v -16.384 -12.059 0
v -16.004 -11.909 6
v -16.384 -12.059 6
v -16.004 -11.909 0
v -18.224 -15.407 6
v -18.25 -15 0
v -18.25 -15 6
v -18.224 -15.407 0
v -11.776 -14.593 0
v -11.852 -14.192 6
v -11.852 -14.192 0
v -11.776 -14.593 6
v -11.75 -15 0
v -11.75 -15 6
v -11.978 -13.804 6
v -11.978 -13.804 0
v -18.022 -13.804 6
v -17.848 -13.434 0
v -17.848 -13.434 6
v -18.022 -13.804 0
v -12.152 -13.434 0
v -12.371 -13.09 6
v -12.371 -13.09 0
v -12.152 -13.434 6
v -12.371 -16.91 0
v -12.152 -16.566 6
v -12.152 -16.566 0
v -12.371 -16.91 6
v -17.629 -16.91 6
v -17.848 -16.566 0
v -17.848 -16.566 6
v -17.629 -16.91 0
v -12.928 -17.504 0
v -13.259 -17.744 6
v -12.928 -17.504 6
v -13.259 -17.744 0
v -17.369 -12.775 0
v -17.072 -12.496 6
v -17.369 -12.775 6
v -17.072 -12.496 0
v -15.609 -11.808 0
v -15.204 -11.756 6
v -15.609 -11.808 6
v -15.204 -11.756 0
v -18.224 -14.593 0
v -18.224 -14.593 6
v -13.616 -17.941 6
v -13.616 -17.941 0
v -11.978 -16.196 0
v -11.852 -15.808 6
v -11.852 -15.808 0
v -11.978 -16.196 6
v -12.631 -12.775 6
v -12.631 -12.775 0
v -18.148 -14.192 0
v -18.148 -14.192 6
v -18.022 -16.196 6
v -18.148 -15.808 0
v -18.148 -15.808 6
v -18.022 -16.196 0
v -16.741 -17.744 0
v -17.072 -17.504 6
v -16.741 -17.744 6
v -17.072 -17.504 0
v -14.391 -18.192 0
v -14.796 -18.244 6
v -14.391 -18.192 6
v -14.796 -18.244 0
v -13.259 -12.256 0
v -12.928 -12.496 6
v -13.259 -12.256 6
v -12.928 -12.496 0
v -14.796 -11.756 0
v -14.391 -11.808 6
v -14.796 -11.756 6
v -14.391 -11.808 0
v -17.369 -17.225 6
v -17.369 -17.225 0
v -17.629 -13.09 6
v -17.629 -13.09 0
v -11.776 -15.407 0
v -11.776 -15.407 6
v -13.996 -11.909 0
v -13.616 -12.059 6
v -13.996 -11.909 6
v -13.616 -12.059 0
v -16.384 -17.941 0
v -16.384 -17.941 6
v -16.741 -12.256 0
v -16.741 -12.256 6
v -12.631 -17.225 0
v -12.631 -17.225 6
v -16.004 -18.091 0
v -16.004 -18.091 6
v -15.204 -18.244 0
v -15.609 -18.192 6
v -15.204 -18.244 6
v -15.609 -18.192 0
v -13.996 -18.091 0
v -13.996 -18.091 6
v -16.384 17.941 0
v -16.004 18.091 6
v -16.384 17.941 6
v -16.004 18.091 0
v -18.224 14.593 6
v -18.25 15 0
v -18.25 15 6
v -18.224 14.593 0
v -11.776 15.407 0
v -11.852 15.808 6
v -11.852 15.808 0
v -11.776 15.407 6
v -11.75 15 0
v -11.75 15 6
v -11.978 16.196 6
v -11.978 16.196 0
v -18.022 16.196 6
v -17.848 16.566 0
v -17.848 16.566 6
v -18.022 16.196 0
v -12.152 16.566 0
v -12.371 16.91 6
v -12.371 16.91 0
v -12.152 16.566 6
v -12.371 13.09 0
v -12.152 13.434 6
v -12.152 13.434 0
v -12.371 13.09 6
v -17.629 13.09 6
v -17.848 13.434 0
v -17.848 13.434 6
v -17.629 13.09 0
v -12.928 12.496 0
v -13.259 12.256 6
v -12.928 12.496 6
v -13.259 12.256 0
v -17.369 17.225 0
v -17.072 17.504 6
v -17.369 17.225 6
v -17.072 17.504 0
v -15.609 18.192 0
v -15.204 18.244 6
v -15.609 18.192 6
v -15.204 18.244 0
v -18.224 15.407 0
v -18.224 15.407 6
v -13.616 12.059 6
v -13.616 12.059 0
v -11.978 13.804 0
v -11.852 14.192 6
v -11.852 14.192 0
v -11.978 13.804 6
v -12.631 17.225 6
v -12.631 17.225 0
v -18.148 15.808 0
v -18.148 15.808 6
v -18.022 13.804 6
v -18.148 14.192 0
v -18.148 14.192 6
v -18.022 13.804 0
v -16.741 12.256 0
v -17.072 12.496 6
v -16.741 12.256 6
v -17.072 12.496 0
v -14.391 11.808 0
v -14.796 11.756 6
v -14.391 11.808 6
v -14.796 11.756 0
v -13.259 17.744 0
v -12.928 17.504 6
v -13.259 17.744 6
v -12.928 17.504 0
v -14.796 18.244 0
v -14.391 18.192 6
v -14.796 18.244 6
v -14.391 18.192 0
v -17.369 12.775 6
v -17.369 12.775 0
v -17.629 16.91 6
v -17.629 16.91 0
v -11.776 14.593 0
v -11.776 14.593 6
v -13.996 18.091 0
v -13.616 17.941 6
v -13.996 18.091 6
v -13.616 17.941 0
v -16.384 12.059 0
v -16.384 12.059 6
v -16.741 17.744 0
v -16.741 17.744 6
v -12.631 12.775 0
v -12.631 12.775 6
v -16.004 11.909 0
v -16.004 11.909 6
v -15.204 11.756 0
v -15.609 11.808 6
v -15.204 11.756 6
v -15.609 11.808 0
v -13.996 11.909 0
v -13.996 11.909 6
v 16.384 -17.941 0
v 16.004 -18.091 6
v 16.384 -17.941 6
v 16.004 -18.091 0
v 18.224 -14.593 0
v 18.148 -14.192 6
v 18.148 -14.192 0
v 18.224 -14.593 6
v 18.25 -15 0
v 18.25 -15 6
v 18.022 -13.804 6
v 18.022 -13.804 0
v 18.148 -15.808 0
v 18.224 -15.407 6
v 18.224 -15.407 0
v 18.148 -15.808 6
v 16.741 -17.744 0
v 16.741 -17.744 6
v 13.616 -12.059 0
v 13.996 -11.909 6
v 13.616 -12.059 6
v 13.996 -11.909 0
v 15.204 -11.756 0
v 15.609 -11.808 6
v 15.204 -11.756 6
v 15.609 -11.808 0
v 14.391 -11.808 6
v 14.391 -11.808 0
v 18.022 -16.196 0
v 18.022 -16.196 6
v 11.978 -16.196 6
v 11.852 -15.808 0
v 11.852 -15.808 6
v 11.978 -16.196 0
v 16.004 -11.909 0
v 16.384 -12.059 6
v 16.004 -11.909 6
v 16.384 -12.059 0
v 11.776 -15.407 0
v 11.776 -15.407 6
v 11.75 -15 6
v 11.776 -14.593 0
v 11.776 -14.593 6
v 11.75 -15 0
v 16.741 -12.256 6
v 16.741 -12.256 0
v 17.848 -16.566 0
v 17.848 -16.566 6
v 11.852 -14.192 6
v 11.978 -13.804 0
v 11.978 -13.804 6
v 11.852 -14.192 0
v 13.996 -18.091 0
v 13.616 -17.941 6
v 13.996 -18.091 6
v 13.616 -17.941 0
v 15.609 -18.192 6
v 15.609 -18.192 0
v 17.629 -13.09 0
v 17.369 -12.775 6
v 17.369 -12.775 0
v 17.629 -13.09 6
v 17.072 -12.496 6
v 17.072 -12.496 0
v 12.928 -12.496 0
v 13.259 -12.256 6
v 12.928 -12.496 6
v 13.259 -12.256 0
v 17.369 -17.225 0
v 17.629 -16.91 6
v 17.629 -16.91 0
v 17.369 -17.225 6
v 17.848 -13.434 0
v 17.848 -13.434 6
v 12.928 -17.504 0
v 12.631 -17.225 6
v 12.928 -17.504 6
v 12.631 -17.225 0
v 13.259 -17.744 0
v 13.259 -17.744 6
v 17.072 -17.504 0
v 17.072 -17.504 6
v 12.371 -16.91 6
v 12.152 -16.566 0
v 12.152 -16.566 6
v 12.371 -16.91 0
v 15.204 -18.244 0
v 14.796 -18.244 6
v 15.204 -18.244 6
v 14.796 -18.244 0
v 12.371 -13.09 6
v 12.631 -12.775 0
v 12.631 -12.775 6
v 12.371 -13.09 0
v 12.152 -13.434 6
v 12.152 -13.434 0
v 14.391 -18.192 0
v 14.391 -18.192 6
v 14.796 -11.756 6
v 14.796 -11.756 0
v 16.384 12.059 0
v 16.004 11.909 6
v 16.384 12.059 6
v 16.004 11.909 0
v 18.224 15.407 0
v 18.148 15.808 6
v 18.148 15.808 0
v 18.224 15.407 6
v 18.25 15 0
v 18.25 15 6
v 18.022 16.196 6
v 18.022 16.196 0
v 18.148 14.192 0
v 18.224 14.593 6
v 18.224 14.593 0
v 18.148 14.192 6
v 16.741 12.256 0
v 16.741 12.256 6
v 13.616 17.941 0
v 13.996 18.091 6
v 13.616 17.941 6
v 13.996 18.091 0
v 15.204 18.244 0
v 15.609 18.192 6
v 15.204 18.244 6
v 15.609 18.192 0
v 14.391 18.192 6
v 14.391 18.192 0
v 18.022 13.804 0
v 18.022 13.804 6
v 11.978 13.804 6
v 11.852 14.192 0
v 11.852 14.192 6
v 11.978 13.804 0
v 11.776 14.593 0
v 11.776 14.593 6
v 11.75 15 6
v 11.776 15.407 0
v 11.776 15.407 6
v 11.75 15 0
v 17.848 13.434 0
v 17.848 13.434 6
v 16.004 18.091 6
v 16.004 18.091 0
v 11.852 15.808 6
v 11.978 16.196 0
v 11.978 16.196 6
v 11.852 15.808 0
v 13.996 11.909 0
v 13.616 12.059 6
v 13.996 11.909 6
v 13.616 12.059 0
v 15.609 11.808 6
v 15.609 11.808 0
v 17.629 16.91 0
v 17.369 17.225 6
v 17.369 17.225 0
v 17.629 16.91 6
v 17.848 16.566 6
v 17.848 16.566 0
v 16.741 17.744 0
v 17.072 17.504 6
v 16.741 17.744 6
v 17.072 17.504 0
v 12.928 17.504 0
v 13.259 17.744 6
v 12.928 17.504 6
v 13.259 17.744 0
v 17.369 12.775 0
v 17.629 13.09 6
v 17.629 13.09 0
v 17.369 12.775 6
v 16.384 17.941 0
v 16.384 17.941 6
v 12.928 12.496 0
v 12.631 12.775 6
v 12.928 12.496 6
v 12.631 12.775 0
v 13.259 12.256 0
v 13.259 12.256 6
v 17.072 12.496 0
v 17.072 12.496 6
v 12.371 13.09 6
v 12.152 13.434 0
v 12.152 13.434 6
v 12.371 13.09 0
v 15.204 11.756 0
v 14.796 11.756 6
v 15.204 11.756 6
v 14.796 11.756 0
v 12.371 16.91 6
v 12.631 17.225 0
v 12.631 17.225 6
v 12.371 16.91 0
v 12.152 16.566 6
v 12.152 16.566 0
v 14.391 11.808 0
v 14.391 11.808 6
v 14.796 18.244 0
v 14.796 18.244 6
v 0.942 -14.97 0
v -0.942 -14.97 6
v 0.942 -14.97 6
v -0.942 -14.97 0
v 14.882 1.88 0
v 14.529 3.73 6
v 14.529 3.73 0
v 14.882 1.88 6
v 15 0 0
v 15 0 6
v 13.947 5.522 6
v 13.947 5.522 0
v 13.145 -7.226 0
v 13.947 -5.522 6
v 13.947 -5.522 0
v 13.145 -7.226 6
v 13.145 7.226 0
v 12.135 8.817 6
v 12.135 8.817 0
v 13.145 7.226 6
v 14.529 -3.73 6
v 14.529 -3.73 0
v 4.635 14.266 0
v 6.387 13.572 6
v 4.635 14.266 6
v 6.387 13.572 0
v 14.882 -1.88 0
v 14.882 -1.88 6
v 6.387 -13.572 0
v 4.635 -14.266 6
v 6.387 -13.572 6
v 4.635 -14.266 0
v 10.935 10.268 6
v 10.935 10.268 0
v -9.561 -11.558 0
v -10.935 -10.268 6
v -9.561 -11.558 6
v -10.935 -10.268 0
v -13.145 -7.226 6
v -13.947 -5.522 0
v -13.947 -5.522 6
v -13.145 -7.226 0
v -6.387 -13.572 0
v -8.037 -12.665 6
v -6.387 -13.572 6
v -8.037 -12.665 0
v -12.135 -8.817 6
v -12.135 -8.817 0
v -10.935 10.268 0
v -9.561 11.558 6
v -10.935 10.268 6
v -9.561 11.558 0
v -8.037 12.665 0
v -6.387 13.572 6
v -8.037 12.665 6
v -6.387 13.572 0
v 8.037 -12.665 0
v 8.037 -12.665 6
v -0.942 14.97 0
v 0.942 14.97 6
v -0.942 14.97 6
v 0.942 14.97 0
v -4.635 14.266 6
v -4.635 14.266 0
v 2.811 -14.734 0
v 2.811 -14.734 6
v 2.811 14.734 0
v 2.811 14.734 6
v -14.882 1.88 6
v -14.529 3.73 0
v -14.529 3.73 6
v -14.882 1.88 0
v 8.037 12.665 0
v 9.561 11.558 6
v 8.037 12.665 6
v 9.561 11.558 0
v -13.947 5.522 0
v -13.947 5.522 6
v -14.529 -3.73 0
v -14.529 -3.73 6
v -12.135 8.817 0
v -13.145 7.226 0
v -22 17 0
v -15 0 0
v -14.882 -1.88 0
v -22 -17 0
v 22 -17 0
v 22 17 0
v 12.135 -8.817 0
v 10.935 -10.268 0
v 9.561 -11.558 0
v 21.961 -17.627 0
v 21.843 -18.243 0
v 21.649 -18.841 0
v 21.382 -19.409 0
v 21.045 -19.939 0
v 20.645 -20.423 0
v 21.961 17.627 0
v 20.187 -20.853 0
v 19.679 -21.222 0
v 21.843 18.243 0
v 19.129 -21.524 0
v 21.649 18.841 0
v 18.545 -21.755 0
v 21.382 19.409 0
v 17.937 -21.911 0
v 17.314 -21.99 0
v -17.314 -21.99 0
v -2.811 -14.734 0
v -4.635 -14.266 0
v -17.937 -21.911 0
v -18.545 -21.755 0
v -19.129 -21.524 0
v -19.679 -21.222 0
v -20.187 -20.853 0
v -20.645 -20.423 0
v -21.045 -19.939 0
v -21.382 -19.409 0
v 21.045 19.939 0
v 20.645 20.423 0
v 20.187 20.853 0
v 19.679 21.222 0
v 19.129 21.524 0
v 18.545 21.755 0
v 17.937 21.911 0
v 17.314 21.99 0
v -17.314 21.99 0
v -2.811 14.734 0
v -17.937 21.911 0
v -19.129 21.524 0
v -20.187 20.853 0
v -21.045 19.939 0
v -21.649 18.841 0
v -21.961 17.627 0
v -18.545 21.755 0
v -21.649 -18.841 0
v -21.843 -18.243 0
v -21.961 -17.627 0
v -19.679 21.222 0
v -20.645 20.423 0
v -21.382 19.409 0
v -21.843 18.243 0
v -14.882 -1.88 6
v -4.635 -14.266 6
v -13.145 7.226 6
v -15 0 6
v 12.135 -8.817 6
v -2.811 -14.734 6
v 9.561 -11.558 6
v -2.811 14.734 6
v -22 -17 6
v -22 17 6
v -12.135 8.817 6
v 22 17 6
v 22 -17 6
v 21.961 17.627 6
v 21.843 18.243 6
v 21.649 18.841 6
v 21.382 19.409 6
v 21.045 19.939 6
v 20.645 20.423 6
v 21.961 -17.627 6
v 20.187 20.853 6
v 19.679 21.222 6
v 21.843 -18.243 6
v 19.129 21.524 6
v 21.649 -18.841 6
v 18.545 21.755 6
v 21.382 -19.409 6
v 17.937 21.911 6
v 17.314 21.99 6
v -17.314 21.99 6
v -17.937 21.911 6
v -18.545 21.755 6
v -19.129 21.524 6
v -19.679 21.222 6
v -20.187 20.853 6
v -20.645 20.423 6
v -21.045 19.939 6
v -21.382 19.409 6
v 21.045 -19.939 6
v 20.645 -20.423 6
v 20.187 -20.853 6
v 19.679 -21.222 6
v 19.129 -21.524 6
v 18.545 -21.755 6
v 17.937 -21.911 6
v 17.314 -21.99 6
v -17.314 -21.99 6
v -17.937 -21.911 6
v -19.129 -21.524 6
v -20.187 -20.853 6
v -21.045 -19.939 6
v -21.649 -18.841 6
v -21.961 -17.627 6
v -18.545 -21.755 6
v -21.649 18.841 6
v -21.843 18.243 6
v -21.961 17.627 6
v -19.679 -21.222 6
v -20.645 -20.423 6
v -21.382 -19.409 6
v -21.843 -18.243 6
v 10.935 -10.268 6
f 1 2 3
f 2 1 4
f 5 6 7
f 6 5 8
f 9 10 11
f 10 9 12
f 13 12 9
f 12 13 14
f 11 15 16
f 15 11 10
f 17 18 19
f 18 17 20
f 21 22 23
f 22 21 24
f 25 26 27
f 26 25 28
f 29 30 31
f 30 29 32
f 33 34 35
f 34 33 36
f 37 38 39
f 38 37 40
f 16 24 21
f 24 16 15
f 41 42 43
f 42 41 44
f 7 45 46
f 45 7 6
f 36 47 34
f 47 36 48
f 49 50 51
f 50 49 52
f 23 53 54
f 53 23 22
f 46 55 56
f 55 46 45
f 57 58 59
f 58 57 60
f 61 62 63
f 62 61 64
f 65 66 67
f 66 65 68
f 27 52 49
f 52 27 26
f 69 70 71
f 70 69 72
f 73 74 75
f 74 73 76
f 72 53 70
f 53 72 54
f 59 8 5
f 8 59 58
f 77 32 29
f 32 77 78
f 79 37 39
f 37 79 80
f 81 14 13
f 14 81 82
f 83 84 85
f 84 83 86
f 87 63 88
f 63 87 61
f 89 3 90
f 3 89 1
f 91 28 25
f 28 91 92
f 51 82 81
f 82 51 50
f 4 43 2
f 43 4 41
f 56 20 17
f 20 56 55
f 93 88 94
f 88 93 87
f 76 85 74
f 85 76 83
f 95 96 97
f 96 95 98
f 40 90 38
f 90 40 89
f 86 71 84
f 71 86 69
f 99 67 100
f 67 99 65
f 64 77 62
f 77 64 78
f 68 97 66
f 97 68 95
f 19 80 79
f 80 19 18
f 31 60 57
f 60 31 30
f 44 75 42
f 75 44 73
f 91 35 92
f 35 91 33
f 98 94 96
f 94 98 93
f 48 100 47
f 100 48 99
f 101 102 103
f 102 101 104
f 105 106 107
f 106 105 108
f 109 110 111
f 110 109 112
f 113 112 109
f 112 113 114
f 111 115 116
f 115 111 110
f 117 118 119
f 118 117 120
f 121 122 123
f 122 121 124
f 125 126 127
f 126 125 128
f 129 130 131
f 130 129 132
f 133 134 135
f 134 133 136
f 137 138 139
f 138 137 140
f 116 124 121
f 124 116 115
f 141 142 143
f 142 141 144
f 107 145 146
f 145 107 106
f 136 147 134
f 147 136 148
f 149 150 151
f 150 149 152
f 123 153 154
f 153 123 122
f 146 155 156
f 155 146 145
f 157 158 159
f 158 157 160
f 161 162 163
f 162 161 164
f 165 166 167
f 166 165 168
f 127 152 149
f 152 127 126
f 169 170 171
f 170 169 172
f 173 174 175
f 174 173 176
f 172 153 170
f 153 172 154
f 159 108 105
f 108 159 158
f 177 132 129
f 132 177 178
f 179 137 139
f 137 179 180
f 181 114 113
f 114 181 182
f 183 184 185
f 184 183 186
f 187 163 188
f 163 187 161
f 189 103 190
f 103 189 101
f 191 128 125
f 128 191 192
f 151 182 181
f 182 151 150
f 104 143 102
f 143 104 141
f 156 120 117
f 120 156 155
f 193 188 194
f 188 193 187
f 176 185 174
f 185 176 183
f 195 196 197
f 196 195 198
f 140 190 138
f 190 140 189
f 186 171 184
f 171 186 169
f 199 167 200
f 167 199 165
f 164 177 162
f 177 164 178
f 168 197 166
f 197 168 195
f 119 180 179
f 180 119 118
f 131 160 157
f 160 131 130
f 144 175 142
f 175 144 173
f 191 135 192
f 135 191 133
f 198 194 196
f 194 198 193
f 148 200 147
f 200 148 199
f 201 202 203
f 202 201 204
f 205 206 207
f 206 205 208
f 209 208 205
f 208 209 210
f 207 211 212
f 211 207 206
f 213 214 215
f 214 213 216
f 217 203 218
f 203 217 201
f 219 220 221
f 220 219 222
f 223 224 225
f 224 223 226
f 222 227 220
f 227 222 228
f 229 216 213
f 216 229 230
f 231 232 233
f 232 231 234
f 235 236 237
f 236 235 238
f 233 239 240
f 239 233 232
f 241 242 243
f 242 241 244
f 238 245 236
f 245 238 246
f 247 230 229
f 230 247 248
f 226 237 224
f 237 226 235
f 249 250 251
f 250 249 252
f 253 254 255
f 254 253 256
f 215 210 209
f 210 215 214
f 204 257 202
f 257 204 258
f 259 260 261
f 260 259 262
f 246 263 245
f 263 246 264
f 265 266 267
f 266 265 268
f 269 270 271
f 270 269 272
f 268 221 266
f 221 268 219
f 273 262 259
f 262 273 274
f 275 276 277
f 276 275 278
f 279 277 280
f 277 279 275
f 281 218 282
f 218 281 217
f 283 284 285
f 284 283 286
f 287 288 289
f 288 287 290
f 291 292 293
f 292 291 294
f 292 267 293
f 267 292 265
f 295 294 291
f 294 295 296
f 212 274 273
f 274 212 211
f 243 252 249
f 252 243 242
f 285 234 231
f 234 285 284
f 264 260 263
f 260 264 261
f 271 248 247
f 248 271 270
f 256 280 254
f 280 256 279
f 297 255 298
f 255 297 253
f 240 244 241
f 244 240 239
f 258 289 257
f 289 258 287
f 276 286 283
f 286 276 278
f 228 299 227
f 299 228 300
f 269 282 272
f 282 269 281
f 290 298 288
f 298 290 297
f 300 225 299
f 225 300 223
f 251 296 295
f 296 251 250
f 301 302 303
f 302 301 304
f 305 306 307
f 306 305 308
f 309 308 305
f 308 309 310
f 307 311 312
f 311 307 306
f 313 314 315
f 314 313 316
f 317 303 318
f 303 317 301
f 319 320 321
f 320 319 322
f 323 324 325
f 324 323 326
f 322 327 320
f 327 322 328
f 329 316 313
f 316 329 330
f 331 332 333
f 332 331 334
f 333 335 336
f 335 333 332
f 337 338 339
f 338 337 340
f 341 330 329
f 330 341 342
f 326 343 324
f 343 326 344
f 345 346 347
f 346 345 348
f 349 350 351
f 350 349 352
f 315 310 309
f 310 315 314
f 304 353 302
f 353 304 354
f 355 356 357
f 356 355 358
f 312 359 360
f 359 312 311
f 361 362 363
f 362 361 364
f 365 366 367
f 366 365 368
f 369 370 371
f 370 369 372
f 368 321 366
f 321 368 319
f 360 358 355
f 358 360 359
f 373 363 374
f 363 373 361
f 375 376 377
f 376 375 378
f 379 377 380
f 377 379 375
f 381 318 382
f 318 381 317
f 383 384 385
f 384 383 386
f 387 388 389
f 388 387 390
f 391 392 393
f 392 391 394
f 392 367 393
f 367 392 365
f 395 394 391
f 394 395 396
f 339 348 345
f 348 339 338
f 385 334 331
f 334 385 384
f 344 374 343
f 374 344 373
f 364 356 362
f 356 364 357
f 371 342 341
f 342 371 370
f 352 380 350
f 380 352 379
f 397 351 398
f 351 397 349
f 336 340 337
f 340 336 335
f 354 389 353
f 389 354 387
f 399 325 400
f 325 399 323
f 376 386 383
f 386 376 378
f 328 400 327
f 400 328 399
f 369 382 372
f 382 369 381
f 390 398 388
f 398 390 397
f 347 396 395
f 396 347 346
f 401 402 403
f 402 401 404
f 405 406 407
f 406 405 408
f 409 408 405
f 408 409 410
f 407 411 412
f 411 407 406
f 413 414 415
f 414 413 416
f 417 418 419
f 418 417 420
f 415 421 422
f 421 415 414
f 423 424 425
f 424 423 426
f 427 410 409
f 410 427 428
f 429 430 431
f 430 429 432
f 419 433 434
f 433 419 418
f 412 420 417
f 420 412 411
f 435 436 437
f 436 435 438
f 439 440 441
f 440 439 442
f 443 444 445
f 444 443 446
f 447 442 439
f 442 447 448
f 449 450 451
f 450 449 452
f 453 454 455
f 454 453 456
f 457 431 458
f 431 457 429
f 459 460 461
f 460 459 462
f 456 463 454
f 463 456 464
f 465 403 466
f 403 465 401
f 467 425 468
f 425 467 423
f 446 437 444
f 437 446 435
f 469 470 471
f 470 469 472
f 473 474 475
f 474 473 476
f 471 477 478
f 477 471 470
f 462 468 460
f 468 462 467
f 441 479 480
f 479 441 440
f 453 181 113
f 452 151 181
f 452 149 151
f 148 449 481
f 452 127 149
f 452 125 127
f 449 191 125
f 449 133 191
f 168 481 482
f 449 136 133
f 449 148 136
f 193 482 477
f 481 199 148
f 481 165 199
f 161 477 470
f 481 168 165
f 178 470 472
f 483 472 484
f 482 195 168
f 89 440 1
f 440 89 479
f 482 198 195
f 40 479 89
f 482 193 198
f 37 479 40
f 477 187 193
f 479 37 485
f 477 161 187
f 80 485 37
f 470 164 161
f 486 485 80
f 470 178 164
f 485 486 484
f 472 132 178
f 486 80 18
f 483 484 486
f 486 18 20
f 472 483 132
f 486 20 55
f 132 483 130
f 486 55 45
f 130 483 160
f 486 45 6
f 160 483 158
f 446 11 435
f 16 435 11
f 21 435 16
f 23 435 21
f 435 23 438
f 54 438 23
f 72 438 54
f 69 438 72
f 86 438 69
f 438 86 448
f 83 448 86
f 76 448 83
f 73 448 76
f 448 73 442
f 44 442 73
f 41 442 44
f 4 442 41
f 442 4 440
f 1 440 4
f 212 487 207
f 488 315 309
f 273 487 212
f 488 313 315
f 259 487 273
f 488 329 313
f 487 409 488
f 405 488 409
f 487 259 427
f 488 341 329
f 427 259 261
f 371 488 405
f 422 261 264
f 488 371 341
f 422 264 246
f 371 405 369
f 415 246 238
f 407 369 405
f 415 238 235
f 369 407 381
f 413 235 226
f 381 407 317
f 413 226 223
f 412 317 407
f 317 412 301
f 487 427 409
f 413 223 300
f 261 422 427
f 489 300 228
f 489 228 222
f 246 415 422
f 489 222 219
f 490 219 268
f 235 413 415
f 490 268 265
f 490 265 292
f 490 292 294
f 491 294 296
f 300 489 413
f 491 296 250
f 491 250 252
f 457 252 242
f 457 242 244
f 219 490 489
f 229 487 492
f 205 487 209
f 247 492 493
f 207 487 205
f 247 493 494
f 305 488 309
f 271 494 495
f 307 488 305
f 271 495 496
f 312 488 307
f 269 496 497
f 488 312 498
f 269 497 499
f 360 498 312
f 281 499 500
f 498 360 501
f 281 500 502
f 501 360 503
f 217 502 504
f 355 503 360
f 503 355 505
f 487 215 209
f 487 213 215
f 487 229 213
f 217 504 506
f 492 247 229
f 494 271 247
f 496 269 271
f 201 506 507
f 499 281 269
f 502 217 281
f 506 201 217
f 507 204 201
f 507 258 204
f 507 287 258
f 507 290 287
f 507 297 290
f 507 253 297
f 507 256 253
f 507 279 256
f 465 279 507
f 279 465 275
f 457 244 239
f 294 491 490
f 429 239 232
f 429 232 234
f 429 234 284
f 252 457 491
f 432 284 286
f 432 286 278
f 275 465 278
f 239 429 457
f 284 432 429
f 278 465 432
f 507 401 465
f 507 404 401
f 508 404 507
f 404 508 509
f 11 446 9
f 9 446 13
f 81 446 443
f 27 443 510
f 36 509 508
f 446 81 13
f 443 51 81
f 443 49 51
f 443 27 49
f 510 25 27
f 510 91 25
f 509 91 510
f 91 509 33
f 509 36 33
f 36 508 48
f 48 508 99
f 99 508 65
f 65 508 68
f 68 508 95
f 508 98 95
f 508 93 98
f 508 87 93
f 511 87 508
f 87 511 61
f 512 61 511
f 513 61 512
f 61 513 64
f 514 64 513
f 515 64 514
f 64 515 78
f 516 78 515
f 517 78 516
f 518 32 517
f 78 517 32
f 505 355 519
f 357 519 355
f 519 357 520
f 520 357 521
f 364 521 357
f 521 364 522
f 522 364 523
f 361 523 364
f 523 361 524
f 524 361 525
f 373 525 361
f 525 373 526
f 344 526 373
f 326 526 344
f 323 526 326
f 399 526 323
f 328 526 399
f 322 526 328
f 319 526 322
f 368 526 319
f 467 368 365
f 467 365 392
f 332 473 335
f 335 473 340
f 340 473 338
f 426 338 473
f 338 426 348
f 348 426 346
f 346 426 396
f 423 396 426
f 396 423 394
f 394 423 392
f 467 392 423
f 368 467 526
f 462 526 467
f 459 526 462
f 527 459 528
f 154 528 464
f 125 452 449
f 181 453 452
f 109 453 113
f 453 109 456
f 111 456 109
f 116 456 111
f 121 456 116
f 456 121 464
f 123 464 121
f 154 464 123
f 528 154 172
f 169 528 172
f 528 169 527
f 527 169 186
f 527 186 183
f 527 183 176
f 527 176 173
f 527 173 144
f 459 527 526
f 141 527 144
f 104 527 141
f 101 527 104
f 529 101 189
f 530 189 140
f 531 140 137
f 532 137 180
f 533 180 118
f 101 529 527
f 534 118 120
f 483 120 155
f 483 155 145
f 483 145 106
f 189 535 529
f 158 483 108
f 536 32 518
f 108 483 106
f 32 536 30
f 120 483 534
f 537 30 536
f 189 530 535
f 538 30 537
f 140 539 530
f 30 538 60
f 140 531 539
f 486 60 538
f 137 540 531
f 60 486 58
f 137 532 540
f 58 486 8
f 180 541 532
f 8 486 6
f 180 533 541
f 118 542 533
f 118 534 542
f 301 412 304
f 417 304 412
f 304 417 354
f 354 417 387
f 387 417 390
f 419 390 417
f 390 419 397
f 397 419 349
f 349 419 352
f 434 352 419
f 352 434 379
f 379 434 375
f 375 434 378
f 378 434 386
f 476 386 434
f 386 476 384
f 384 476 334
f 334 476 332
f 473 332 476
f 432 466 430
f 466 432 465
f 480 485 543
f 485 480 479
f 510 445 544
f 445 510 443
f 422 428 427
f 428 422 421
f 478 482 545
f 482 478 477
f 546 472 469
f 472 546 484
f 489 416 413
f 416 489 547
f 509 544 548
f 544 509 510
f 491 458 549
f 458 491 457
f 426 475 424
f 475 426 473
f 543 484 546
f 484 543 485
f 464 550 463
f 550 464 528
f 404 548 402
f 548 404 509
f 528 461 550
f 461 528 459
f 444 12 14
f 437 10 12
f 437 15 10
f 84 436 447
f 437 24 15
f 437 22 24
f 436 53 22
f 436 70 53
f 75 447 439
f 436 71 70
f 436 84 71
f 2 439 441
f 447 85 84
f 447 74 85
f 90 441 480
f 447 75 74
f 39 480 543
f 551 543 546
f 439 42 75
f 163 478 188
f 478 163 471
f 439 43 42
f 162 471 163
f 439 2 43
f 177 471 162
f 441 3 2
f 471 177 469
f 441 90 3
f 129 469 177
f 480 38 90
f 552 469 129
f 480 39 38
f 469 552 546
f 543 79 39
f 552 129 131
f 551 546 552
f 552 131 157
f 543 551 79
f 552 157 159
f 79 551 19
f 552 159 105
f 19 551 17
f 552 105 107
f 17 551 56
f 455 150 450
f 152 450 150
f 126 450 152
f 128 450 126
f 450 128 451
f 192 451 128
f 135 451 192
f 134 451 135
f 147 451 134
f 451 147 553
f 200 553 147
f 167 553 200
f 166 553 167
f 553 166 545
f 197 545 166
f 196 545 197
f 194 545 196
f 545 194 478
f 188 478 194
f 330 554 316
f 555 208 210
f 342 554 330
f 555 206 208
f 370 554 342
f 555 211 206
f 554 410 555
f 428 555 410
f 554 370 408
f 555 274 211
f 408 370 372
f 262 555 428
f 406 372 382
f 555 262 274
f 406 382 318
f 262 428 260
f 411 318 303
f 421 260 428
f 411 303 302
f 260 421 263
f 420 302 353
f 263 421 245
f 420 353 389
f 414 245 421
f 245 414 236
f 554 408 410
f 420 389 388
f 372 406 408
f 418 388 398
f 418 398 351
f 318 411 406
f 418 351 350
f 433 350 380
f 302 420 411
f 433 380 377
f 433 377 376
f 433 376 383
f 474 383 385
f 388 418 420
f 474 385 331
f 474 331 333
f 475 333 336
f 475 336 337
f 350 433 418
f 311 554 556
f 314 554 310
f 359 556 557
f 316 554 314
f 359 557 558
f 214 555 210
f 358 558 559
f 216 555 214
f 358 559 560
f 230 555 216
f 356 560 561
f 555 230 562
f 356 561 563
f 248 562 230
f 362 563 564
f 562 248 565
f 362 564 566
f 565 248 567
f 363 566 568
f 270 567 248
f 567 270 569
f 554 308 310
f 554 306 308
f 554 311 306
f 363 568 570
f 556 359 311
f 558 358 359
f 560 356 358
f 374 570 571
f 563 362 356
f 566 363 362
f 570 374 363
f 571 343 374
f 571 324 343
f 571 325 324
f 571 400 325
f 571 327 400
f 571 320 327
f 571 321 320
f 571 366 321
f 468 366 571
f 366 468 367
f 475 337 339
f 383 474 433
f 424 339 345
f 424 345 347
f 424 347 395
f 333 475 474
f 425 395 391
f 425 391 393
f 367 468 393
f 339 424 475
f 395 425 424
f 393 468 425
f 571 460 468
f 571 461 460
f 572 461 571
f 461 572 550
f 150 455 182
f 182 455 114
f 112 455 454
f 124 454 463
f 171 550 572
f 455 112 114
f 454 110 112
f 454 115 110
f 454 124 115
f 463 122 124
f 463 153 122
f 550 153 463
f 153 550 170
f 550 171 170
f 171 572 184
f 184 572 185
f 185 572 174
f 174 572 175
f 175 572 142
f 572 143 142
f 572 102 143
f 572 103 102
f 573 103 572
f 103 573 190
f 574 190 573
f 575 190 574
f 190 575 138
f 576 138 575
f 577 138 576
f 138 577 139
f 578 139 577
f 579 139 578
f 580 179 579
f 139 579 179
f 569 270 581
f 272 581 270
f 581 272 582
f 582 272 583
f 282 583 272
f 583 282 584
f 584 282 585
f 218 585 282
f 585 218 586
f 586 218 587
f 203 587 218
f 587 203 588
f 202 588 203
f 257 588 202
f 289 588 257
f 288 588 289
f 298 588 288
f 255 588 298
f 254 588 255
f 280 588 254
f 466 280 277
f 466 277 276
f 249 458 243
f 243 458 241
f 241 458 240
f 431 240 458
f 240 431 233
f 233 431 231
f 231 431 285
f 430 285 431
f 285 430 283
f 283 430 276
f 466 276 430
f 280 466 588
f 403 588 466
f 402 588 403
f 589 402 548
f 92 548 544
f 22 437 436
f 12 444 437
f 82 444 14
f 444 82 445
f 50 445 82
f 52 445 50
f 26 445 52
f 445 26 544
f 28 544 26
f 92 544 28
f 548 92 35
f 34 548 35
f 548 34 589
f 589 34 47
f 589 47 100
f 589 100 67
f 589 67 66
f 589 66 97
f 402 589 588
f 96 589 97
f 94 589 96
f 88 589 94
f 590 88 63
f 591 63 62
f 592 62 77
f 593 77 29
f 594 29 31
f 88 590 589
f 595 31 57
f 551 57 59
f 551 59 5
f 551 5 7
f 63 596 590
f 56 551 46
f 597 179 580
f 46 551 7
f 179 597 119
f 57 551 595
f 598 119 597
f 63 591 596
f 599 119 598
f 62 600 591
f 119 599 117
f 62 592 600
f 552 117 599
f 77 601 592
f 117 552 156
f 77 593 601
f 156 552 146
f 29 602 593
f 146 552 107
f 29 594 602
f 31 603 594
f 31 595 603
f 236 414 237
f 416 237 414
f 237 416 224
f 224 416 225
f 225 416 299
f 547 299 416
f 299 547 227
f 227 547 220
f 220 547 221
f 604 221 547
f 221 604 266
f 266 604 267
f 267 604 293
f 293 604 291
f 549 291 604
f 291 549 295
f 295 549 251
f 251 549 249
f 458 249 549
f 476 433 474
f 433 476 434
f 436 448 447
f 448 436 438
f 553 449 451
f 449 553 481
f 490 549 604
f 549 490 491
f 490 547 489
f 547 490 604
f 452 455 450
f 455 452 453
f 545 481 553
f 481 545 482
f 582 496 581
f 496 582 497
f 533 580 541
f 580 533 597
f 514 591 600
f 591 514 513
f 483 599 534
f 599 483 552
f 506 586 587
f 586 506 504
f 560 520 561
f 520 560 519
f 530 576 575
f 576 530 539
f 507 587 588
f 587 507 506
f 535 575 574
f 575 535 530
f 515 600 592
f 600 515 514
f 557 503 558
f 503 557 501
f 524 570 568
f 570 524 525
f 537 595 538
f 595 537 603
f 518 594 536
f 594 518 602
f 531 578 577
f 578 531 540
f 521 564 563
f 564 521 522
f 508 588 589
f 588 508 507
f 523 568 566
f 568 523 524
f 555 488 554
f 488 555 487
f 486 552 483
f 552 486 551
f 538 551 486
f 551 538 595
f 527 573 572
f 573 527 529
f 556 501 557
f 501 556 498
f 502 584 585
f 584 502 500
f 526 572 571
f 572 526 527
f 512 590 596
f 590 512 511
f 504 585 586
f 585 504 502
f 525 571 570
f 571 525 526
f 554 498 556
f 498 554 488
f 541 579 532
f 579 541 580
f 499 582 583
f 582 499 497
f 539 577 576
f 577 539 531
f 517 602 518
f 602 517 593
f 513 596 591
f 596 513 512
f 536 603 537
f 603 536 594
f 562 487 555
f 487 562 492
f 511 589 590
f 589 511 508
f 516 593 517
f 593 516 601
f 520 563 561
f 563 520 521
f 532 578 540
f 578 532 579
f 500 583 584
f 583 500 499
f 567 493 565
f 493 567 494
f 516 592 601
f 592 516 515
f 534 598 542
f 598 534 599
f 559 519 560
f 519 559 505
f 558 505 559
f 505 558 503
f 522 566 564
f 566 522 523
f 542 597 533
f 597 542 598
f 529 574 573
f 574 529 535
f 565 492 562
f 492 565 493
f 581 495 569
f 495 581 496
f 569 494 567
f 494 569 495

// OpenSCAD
$fn = 50;


difference() {
	union() {
		hull() {
			translate(v = [-17.0000000000, 17.0000000000, 0]) {
				cylinder(h = 6, r = 5);
			}
			translate(v = [17.0000000000, 17.0000000000, 0]) {
				cylinder(h = 6, r = 5);
			}
			translate(v = [-17.0000000000, -17.0000000000, 0]) {
				cylinder(h = 6, r = 5);
			}
			translate(v = [17.0000000000, -17.0000000000, 0]) {
				cylinder(h = 6, r = 5);
			}
		}
	}
	union() {
		#translate(v = [-15.0000000000, -15.0000000000, -100.0000000000]) {
			cylinder(h = 200, r = 3.2500000000);
		}
		#translate(v = [-15.0000000000, 15.0000000000, -100.0000000000]) {
			cylinder(h = 200, r = 3.2500000000);
		}
		#translate(v = [15.0000000000, -15.0000000000, -100.0000000000]) {
			cylinder(h = 200, r = 3.2500000000);
		}
		#translate(v = [15.0000000000, 15.0000000000, -100.0000000000]) {
			cylinder(h = 200, r = 3.2500000000);
		}
		#cylinder(h = 6, r = 15.0000000000);
	}
}
